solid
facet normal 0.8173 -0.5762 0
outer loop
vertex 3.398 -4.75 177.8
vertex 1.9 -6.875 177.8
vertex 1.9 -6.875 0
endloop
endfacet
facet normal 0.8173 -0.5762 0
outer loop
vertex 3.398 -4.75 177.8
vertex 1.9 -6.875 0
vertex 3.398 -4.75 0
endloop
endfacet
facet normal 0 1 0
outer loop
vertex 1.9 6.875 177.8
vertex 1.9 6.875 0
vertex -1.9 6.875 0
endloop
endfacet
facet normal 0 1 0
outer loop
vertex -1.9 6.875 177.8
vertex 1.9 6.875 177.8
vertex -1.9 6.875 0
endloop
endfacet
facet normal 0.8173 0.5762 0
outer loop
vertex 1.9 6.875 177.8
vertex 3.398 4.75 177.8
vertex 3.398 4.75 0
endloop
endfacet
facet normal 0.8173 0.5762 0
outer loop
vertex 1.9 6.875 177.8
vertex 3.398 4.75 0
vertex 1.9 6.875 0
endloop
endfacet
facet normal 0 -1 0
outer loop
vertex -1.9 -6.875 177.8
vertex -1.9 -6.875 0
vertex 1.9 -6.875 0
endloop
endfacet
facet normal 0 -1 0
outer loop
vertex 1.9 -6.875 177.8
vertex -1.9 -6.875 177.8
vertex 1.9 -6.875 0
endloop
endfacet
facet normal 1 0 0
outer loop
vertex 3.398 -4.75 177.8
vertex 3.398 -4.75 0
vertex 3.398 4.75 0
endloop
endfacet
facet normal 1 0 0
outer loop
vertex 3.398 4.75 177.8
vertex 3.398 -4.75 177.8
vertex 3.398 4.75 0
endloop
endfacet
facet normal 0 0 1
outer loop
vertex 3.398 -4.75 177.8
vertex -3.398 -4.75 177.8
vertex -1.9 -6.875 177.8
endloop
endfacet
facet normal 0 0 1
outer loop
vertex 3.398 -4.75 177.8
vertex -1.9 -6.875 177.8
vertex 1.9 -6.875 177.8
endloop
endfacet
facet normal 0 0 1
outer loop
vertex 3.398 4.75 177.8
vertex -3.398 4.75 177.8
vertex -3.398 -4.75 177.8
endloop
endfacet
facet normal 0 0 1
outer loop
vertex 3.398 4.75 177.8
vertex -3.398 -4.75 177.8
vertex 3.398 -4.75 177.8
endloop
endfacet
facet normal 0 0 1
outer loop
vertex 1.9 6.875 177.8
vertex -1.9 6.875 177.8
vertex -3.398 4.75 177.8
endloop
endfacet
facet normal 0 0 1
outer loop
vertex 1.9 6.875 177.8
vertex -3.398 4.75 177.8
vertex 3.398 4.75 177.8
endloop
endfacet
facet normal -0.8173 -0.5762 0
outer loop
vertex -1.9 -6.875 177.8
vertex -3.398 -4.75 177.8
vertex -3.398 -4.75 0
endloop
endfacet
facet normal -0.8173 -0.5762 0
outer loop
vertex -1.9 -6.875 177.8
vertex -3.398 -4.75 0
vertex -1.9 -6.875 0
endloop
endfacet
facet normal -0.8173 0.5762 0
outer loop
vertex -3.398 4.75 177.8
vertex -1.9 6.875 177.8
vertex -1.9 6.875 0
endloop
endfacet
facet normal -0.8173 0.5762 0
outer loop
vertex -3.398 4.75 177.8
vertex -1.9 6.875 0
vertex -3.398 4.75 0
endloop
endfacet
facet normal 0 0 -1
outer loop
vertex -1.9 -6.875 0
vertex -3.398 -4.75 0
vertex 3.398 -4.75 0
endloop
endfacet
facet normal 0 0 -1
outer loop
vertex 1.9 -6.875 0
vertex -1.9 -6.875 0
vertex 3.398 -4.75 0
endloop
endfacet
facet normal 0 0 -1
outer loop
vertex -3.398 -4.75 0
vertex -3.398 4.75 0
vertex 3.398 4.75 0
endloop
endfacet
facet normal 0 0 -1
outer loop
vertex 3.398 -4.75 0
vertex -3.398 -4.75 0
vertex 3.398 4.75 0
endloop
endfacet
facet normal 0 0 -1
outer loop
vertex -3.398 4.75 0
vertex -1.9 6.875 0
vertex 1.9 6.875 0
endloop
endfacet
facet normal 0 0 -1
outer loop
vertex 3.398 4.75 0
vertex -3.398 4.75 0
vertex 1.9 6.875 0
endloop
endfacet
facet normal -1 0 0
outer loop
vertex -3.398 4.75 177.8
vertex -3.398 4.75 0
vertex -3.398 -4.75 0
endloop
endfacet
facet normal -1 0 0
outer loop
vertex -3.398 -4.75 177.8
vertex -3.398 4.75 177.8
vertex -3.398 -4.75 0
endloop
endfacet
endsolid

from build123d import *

# Parameters (mm, degrees)
F1_DEPTH = 177.8


with BuildPart() as f1:
    # F0 (on Top) → F1 (new body)
    with BuildSketch(Plane.XY):
        Polygon((-3.398124, 0), (0, 0), (0, 6.875), (-1.9, 6.875), (-3.398124, 4.75), align=None)
        Polygon((0, 6.875), (0, 0), (3.398124, 0), (3.398124, 4.75), (1.9, 6.875), align=None)
        Polygon((3.398124, 0), (0, 0), (-3.398124, 0), (-3.398124, -4.75), (-1.9, -6.875), (0, -6.875), (1.9, -6.875), (3.398124, -4.75), align=None)
    extrude(amount=F1_DEPTH)


solid = f1.part
